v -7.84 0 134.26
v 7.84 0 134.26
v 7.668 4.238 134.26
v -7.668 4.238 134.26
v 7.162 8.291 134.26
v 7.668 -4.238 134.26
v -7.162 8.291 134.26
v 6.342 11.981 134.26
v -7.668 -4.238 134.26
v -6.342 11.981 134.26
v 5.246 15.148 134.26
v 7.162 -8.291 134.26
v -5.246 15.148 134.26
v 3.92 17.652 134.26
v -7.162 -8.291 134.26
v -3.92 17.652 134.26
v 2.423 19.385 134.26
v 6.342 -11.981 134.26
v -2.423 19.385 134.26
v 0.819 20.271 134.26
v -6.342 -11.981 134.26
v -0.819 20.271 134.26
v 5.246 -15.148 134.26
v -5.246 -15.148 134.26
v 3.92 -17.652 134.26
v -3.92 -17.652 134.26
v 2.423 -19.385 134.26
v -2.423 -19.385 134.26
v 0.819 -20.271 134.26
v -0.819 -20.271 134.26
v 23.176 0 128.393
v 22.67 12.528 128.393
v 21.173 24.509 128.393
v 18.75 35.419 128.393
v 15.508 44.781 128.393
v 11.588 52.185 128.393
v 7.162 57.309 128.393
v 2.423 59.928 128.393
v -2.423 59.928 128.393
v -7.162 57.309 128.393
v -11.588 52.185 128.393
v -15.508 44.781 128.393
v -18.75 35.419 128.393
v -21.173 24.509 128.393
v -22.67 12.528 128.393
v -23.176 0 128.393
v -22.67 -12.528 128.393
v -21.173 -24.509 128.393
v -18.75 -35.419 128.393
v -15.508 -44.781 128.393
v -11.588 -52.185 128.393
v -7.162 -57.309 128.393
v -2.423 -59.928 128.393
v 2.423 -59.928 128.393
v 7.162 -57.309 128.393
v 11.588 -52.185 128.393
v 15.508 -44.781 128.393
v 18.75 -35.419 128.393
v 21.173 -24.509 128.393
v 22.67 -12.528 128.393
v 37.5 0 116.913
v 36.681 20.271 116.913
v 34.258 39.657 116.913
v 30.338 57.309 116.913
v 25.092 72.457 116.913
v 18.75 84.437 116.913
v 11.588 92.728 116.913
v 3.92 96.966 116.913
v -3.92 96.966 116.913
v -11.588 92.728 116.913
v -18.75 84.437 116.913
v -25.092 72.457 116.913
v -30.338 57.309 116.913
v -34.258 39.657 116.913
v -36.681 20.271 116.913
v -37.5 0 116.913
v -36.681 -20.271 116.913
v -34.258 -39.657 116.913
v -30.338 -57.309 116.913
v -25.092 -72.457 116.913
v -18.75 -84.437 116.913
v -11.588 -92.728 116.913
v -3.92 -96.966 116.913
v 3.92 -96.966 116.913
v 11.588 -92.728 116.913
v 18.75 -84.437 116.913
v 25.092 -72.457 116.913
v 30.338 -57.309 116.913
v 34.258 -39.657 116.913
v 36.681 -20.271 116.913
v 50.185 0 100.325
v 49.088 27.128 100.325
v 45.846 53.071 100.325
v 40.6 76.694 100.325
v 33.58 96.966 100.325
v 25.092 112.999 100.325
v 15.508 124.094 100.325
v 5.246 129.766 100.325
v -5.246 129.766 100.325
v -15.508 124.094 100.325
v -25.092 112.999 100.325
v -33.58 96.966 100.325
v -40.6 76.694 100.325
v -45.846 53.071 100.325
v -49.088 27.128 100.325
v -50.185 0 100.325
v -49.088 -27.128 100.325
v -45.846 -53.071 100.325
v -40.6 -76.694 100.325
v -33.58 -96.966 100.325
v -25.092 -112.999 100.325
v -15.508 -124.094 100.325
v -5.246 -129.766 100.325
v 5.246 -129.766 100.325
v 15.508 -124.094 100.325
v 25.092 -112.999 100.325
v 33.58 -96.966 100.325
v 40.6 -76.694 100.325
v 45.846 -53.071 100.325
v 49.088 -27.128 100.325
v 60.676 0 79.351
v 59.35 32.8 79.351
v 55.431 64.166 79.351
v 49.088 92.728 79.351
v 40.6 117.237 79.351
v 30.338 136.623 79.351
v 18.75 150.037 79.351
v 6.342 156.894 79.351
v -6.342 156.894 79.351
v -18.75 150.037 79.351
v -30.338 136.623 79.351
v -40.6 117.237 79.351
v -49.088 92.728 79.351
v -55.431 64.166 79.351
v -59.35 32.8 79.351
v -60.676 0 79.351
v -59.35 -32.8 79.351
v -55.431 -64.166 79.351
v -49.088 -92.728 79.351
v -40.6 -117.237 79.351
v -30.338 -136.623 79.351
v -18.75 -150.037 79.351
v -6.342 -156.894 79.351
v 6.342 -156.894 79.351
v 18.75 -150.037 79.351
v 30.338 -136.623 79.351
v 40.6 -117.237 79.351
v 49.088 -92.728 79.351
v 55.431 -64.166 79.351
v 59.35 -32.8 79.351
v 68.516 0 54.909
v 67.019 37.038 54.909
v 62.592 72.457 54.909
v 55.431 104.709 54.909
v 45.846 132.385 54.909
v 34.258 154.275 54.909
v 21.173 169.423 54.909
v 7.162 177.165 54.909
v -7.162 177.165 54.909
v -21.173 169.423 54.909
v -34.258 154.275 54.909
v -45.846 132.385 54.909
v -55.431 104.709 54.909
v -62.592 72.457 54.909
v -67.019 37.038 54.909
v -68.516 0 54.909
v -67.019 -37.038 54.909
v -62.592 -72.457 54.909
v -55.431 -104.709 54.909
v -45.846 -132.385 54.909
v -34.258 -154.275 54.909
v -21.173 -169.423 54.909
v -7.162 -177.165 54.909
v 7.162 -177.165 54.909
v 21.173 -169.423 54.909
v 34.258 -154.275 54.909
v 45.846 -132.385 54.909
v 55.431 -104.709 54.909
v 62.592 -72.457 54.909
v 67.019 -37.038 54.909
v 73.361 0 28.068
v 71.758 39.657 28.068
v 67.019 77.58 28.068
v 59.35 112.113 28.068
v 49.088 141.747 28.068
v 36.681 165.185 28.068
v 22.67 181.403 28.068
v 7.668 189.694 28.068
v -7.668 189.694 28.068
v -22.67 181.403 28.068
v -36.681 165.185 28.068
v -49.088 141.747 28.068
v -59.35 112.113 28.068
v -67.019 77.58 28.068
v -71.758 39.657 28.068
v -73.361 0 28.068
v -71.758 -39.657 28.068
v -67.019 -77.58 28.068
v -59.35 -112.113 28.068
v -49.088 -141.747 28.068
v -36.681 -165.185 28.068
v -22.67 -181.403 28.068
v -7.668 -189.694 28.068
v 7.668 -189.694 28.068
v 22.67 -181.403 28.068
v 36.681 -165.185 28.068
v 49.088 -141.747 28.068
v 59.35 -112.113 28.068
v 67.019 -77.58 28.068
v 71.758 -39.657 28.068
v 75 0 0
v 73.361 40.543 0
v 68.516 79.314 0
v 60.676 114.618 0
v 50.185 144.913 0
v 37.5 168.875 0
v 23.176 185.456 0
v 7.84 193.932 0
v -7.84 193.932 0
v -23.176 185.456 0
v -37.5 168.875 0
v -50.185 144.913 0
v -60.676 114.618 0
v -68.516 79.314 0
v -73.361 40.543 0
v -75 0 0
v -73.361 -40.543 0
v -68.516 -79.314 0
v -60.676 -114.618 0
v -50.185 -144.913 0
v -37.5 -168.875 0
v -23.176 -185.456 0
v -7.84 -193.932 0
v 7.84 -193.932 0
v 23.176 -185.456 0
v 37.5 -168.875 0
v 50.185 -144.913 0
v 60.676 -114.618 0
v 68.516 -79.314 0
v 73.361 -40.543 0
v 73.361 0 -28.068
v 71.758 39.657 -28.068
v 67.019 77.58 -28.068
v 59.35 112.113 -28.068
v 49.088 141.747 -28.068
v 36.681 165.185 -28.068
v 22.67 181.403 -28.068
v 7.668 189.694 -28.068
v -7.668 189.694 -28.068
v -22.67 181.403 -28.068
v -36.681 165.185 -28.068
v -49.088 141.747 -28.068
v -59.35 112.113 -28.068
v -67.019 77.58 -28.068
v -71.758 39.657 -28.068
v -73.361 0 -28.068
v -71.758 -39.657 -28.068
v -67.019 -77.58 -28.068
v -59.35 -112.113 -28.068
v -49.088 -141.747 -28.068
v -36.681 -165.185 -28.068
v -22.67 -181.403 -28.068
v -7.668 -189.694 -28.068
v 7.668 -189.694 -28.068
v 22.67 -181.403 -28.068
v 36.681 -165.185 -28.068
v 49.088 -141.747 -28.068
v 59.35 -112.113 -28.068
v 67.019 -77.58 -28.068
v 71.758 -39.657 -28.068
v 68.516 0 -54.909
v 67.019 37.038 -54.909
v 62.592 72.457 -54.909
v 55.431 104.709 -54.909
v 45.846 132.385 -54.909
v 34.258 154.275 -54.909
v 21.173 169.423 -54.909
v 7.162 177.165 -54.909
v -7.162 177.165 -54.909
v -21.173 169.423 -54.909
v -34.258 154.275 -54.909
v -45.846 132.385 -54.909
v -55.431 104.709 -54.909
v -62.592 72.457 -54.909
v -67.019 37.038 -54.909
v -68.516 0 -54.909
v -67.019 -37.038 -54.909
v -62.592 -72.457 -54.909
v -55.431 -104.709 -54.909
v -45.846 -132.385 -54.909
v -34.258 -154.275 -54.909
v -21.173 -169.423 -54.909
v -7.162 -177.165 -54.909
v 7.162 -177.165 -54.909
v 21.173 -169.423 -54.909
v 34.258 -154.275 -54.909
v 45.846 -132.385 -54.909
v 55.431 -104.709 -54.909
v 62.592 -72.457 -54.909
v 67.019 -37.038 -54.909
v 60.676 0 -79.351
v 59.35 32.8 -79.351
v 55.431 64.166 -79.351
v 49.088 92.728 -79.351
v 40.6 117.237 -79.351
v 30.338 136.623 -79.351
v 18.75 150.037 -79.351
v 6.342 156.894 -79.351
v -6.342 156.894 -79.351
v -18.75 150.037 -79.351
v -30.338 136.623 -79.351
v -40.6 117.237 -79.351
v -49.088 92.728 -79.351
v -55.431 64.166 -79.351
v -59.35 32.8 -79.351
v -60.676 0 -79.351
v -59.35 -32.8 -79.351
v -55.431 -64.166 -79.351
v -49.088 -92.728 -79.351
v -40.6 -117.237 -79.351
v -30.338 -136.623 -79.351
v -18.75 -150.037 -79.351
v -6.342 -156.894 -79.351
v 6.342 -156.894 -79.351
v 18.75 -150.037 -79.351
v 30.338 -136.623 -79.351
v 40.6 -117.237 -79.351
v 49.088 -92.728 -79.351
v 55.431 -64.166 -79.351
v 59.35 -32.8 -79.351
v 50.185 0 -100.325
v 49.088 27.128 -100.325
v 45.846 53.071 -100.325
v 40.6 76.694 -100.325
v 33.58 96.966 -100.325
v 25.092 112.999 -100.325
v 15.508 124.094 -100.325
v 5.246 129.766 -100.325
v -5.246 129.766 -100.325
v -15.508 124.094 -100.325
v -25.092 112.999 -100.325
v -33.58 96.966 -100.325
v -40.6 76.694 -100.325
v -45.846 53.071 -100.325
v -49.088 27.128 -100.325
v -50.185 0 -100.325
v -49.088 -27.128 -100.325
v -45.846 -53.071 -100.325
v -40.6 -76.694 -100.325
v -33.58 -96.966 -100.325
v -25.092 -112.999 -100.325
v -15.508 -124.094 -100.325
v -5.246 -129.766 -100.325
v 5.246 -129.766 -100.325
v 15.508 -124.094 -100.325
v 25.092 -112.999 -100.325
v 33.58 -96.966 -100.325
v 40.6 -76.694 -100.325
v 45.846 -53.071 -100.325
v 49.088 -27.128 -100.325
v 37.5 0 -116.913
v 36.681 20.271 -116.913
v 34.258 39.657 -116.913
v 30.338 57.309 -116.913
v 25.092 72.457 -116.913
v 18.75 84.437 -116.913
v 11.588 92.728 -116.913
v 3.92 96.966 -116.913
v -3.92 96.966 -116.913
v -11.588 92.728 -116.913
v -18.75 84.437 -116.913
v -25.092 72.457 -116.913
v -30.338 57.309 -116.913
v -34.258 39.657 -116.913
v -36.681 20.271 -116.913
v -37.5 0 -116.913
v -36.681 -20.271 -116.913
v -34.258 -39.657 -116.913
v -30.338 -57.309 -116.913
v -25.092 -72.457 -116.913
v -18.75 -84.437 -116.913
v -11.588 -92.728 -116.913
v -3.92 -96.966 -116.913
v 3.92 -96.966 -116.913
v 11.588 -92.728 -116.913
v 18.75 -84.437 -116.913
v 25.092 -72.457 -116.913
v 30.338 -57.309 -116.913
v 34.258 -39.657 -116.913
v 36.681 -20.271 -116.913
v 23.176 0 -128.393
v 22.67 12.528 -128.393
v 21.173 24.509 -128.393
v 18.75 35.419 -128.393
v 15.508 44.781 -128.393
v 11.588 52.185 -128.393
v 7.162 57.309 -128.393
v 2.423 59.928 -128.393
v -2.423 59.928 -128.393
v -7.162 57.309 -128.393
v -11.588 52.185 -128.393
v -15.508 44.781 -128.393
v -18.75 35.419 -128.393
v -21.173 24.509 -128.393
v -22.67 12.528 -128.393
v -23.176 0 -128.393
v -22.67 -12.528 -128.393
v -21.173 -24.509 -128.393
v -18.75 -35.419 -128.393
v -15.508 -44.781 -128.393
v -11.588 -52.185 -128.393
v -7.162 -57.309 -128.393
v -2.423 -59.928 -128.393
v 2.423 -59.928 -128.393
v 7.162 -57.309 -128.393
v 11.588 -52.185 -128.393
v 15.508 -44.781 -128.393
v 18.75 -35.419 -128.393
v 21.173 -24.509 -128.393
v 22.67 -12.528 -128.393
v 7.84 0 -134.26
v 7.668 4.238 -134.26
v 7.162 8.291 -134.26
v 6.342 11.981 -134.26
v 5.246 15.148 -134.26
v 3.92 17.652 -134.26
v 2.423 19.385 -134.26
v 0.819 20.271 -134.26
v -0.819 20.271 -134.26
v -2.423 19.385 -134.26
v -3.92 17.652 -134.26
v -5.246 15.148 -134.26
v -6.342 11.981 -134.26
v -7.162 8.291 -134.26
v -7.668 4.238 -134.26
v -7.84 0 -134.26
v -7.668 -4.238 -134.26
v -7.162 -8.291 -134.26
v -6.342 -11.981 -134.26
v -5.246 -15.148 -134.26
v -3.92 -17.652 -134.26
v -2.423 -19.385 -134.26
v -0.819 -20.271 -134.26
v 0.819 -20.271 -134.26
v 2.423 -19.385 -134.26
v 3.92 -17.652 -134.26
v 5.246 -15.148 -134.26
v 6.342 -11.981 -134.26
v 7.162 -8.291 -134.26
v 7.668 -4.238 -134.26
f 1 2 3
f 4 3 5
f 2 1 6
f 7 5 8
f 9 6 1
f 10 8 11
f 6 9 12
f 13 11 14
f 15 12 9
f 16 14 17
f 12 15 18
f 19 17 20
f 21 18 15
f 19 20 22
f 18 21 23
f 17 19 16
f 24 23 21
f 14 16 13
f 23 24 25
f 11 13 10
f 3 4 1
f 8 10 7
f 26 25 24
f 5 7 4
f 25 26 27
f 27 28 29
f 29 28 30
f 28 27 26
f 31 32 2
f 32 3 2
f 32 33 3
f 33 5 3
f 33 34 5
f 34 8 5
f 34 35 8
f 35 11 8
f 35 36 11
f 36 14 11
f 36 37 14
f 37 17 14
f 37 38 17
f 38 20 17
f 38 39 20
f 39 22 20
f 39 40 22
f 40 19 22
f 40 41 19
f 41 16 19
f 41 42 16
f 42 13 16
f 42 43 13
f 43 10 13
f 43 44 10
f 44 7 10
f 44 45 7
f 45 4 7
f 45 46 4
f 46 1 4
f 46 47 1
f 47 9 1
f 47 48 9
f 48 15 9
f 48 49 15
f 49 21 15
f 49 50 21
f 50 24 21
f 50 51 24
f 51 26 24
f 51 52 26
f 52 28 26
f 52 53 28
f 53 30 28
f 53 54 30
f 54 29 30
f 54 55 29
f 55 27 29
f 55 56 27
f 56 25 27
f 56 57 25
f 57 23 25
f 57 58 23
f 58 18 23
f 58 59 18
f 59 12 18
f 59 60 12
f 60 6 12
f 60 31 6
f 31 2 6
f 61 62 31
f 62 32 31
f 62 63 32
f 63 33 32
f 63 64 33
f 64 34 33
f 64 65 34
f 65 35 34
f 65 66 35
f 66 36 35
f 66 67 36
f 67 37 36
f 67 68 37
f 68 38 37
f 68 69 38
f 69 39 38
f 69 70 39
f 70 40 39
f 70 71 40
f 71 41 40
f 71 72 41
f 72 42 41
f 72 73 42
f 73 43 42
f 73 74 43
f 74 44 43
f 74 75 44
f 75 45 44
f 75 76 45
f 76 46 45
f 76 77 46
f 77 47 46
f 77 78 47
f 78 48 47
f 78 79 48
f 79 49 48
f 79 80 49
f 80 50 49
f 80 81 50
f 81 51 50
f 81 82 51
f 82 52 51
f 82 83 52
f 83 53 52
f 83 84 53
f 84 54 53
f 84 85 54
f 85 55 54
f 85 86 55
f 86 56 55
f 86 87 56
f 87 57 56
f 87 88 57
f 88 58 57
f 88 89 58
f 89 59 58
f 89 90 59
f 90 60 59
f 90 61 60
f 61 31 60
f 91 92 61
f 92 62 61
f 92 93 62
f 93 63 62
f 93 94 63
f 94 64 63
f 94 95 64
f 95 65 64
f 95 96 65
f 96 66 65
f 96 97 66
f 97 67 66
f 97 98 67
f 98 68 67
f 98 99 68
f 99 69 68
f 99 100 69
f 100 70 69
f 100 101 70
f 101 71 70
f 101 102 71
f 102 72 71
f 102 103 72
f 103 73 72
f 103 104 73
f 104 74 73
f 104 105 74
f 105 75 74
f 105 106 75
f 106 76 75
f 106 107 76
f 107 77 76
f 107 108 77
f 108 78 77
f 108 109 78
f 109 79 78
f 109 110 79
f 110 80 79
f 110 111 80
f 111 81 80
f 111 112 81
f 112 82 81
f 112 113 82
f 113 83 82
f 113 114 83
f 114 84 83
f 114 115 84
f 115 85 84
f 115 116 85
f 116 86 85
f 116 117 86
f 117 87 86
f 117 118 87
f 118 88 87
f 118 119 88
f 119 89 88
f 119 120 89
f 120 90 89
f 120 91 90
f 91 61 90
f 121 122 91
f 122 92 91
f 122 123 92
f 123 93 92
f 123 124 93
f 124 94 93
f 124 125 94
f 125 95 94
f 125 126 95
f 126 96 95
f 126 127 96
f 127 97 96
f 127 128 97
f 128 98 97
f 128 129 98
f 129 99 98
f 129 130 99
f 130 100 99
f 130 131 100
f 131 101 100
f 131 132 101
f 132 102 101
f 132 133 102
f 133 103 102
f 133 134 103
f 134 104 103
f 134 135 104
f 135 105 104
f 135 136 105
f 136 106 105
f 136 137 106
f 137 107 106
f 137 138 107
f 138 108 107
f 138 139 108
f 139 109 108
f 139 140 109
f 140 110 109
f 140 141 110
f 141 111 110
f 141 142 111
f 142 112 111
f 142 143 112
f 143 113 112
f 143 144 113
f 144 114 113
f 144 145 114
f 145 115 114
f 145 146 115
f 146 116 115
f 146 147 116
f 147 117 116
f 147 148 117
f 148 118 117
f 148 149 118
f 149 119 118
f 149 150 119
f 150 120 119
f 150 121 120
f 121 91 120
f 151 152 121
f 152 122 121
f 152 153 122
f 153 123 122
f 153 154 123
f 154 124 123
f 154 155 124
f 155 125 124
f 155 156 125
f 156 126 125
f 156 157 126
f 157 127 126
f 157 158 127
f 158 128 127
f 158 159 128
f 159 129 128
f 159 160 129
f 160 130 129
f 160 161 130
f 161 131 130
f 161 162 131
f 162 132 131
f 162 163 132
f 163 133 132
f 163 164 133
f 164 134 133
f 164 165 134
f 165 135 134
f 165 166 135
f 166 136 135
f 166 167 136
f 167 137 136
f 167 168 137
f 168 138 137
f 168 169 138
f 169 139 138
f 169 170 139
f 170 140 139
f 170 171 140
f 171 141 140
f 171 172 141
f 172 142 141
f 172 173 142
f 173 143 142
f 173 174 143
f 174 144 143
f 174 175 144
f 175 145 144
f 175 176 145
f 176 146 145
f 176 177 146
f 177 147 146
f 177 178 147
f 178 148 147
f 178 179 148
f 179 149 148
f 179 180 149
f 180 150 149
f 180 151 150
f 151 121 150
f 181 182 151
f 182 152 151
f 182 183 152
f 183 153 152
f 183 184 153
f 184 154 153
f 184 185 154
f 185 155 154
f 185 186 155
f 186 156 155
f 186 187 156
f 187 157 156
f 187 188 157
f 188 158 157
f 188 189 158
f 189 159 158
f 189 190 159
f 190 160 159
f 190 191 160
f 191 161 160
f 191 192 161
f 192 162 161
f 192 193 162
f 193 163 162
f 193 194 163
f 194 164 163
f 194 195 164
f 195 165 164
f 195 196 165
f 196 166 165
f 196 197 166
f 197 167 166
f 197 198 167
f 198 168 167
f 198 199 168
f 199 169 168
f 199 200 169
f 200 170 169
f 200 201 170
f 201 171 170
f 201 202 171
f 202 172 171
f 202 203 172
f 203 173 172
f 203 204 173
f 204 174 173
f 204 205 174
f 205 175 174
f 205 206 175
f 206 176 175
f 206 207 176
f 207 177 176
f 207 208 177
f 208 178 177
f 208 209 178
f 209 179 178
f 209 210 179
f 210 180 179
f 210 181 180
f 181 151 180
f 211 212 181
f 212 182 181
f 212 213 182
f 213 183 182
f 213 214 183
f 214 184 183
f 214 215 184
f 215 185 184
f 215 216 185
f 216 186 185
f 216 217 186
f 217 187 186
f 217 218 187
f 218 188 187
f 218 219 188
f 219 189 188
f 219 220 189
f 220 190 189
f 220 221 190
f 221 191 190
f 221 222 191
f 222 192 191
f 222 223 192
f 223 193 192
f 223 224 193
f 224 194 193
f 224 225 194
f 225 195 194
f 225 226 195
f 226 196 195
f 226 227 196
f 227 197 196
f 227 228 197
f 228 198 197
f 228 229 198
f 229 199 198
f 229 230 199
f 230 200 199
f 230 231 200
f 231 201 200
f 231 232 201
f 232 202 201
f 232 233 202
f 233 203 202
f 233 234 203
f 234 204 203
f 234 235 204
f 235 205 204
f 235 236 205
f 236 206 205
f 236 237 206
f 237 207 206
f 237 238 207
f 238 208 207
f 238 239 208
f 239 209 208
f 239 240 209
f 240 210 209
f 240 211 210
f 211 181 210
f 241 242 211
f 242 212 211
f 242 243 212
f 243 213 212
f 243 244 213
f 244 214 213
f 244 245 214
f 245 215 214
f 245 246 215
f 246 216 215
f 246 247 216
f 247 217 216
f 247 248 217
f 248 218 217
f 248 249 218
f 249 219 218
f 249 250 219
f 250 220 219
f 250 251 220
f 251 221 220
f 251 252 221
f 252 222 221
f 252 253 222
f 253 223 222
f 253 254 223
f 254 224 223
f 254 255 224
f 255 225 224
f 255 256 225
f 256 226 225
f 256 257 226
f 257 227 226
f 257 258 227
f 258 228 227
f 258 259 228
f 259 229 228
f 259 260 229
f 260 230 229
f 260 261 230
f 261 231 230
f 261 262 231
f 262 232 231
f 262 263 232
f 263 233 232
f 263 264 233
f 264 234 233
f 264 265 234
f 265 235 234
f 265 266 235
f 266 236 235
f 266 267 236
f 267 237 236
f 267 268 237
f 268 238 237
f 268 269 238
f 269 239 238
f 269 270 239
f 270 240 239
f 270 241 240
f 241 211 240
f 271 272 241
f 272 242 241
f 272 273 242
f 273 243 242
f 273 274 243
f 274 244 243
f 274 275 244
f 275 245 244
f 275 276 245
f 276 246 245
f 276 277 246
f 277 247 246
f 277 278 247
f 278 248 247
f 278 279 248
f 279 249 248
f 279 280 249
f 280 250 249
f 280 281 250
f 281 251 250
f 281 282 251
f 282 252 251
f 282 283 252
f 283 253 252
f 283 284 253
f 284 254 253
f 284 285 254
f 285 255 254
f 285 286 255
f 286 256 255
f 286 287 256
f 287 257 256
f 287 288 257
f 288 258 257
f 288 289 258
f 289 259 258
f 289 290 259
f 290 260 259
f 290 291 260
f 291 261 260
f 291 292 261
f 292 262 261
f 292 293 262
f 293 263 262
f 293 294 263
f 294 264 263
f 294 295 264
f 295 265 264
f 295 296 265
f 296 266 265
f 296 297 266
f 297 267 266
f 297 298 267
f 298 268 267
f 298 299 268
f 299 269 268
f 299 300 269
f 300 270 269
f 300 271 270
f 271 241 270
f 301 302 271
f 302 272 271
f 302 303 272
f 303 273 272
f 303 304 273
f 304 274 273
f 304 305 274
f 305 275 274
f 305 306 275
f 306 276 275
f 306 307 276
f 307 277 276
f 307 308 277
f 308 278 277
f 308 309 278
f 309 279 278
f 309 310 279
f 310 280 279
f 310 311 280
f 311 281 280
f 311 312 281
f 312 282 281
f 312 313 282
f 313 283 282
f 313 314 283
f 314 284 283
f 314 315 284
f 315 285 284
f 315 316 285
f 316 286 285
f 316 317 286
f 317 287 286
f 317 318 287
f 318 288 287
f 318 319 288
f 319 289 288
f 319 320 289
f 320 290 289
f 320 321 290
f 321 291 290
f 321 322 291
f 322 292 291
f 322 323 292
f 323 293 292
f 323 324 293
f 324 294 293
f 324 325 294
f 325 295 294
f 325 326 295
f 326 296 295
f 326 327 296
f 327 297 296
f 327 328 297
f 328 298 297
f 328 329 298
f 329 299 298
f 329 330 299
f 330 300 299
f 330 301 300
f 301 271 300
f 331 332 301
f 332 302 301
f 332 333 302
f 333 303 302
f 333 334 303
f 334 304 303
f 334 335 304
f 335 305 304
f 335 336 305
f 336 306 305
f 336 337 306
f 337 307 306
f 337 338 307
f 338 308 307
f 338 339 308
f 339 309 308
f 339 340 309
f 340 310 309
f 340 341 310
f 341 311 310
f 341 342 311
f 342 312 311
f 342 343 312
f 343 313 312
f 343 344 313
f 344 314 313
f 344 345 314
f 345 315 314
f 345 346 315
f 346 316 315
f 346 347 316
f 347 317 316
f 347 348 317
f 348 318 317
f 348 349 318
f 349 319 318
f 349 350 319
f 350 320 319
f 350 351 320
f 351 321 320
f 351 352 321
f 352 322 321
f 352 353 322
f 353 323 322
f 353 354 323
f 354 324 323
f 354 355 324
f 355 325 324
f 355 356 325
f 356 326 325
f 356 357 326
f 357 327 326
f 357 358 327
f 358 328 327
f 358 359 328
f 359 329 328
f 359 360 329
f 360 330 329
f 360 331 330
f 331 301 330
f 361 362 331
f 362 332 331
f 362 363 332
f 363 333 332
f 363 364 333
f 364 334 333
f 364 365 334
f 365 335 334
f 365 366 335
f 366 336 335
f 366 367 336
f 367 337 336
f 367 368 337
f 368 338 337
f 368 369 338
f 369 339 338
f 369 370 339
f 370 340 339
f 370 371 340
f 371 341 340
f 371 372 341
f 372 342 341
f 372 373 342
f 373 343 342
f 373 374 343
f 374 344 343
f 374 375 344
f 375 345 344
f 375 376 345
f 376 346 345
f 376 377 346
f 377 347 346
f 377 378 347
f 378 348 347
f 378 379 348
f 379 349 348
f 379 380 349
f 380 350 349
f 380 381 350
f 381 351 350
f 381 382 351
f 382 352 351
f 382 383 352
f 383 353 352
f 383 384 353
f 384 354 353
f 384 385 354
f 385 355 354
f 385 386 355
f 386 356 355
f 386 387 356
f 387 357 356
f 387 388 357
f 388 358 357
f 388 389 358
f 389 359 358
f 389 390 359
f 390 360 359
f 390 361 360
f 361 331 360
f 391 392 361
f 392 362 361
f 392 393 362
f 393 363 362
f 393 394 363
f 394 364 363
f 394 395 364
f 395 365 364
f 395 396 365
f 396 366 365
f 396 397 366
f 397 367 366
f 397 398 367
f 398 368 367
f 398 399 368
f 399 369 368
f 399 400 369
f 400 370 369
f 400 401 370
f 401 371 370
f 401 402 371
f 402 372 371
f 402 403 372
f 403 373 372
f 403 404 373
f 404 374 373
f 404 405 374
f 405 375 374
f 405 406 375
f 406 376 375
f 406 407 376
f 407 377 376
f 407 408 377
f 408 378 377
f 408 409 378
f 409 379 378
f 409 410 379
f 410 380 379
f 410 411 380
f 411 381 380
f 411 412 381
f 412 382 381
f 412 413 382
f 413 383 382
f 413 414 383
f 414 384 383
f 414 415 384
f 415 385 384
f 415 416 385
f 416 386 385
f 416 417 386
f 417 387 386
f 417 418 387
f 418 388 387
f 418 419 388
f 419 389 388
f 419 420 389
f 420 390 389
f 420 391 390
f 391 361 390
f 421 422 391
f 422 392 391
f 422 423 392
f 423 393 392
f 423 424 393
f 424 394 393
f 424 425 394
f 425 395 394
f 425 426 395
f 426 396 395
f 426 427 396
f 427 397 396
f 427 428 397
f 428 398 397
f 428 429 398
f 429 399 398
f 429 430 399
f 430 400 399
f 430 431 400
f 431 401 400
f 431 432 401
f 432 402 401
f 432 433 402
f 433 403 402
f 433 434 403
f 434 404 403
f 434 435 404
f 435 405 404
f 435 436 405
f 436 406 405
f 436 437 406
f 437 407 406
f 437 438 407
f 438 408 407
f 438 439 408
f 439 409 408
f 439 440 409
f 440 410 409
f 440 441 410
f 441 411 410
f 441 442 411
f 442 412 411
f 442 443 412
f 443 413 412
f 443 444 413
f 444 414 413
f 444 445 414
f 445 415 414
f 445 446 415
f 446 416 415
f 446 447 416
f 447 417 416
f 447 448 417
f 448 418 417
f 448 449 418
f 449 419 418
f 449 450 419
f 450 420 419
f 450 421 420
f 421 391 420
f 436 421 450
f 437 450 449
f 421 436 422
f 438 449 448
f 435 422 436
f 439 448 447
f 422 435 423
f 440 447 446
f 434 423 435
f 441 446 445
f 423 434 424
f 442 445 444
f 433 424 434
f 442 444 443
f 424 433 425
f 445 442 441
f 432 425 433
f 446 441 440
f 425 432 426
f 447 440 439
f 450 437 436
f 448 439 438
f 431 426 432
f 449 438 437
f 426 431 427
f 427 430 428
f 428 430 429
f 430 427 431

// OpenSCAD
// Generated by SolidPython 1.0.1 on 2020-07-29 00:46:46


scale(v = [5, 13, 9]) {
	sphere(r = 15);
}
/***********************************************
*********      SolidPython code:      **********
************************************************
 
# import packages: SolidPython
from solid import *
from solid.utils import *
from itertools import chain, combinations, permutations


class Resize:

    def __init__(self, scad_file):
        self.scad_file = scad_file
        #self.scad_file = import_scad(scad_file)
        # cone/cylinder param:
        self.r1 = 0
        self.r2 = 0
        self.h = 0
        # rectangular prism param:
        self.w = 0
        self.l = 0
        # ellipse param:
        self.r = 0

    # import OpenScad code (file name corresponds to shape)


    # classify shape + parameters
    def assign(self, param1, param2, param3):
        if self.scad_file == 'cone.scad':
            self.r1 = param1
            self.r2 = param2
            self.h = param3
        elif self.scad_file == 'cylinder.scad':
            self.r1 = param1
            self.r2 = param2
            self.h = param3
        elif self.scad_file == 'rectangularPrism.scad':
            self.h = param1
            self.l = param2
            self.w = param3
        else:
            self.r = param1
            self.h = param2

    # resize parameters
    def iterate(self):
        x = range(3, 20, 2)
        i = 1
        if self.scad_file == 'cone.scad':
            tempList = list(permutations(x, 2))
            for temp in tempList:
                param1 = temp[0]
                param2 = temp[1]
                filepath = 'produced_scad_files/' + 'cone' + str(param1) + '_' + str(param2) + '_' + '.scad'
                scad_render_to_file(cylinder(h=param1, r1=param2, r2=0), filepath)

        elif self.scad_file == 'cylinder.scad':
            tempList = list(permutations(x, 3))
            for temp in tempList:
                param1 = temp[0]
                param2 = temp[1]
                filepath = 'produced_scad_files/' + 'cylinder' + str(param1) + '_' + str(param2) + '_' + '.scad'
                scad_render_to_file(cylinder(h=param1, r1=param2, r2=param2), filepath)

        elif self.scad_file == 'rectangularPrism.scad':
            tempList = list(permutations(x, 3))
            for temp in tempList:
                param1 = temp[0]
                param2 = temp[1]
                param3 = temp[2]
                filepath = 'produced_scad_files/' + 'rectangularPrism' + str(param1) + '_' + str(param2) + '_' + str(
                    param3) + '.scad'
                scad_render_to_file(cube(size=(param1, param2, param3)), filepath)

        elif self.scad_file == 'ellipse.scad':
            tempList = list(permutations(x, 4))
            for temp in tempList:
                param1 = temp[0]
                param2 = temp[1]
                param3 = temp[2]
                param4 = temp[3]
                filepath = 'produced_scad_files/' + 'ellipse' + str(param1) + '_' + str(param2) + '_' + str(param3) + '_' + str(param4) + '.scad'
                scad_render_to_file(scale([param1, param2, param3])(sphere(r=param4)), filepath)

    def render_to_scadfile(self):
        scad_render_to_file(scad, 'example.scad') 
 
************************************************/
